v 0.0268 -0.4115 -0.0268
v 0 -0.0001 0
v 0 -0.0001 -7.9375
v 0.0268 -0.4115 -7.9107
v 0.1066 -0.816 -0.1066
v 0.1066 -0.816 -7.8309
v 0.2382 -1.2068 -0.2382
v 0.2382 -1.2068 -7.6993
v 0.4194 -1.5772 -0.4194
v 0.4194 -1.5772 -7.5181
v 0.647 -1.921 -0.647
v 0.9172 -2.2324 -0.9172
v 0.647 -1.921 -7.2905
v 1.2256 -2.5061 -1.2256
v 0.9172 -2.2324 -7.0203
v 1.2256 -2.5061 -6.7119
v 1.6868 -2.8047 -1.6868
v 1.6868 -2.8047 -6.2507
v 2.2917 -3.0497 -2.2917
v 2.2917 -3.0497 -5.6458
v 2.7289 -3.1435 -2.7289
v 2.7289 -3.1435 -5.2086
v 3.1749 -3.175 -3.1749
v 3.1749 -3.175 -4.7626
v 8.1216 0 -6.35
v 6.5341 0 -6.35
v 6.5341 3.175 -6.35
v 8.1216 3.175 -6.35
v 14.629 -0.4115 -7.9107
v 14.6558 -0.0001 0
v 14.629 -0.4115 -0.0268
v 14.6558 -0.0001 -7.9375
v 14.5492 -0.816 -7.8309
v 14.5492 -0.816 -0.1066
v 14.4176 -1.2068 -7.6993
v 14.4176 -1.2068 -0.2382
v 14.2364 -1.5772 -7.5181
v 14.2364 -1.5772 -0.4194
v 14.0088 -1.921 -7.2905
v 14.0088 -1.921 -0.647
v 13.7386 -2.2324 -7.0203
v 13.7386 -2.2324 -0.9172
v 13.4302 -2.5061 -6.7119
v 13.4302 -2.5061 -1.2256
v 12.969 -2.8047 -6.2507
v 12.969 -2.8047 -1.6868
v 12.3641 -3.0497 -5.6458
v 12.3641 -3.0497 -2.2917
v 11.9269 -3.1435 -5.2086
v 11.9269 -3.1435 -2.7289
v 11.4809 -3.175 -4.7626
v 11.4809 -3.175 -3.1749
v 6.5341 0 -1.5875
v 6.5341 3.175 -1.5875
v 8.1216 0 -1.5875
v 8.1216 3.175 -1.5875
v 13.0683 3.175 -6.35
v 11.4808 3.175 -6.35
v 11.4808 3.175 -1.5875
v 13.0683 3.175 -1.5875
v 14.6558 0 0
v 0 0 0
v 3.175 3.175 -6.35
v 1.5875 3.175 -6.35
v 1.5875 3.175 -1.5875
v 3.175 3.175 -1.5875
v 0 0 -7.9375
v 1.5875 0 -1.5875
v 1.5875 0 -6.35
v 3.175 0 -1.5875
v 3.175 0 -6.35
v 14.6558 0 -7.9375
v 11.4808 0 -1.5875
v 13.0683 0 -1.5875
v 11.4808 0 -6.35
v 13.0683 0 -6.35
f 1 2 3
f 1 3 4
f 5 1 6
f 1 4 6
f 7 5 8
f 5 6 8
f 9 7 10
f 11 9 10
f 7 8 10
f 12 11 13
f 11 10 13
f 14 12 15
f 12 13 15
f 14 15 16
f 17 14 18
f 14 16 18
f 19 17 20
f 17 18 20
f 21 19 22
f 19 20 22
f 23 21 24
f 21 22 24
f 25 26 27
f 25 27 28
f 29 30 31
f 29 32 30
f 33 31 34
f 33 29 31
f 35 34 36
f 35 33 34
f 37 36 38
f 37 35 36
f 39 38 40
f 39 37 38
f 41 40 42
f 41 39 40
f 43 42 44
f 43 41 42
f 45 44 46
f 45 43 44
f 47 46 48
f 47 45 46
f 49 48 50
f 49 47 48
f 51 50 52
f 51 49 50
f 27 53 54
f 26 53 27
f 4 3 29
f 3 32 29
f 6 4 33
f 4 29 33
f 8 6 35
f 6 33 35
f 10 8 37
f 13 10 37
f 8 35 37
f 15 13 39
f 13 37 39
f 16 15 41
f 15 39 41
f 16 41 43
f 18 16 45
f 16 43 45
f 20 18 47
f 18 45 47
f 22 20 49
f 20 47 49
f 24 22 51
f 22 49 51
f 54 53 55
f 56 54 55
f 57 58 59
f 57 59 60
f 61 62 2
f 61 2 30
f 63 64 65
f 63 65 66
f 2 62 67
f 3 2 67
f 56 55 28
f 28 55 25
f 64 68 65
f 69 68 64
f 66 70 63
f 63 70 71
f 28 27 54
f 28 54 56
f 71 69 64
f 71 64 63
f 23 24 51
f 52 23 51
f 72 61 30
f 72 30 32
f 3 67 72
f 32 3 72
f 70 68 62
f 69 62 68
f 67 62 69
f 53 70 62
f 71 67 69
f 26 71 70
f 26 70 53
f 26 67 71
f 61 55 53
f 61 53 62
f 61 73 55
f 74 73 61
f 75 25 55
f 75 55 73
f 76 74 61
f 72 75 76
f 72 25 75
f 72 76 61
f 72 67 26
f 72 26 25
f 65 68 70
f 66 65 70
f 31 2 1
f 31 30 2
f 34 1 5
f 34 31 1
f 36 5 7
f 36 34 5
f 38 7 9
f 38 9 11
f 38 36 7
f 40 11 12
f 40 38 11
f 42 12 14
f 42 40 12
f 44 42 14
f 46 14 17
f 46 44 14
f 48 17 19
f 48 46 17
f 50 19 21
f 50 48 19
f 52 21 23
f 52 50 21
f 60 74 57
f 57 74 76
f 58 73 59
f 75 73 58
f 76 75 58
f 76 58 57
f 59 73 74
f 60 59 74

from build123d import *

# Parameters (mm, degrees)
SKETCH1_W           = 14.6558
SKETCH1_H           = 7.9375
SKETCH1_W_2         = 1.5875
SKETCH1_H_2         = 4.7625
BOSS_EXTRUDE1_DEPTH = 3.175
SKETCH1_3_W         = 1.5875
SKETCH1_3_H         = 4.7625
BOSS_EXTRUDE2_DEPTH = 3.175
FILLET1_R           = 3.175


with BuildPart() as part:
    # Sketch1 → Boss-Extrude1 (new body)
    # profile 1 of 4: a face of its own
    with BuildSketch(Plane(origin=(0, 0, 0), x_dir=(1, 0, 0), z_dir=(0, 1, 0))):
        with Locations((7.3279, 3.96875)):
            Rectangle(SKETCH1_W, SKETCH1_H)
        with Locations((12.27455, 3.96875)):
            Rectangle(SKETCH1_W_2, SKETCH1_H_2, mode=Mode.SUBTRACT)
        with Locations((7.3279, 3.96875)):
            Rectangle(SKETCH1_W_2, SKETCH1_H_2, mode=Mode.SUBTRACT)
        with Locations((2.38125, 3.96875)):
            Rectangle(SKETCH1_W_2, SKETCH1_H_2, mode=Mode.SUBTRACT)
    # profile 2 of 4: a face of its own
    with BuildSketch(Plane(origin=(0, 0, 0), x_dir=(1, 0, 0), z_dir=(0, 1, 0))):
        with Locations((2.38125, 3.96875)):
            Rectangle(SKETCH1_W_2, SKETCH1_H_2)
    # profile 3 of 4: a face of its own
    with BuildSketch(Plane(origin=(0, 0, 0), x_dir=(1, 0, 0), z_dir=(0, 1, 0))):
        with Locations((7.3279, 3.96875)):
            Rectangle(SKETCH1_W_2, SKETCH1_H_2)
    # profile 4 of 4: a face of its own
    with BuildSketch(Plane(origin=(0, 0, 0), x_dir=(1, 0, 0), z_dir=(0, 1, 0))):
        with Locations((12.27455, 3.96875)):
            Rectangle(SKETCH1_W_2, SKETCH1_H_2)
    extrude(amount=-BOSS_EXTRUDE1_DEPTH)

    # Sketch1<3> → Boss-Extrude2 (add)
    with BuildSketch(Plane(origin=(0, 0, 0), x_dir=(1, 0, 0), z_dir=(0, 1, 0))):
        with Locations((2.38125, 3.96875)):
            Rectangle(SKETCH1_3_W, SKETCH1_3_H)
        with Locations((7.3279, 3.96875)):
            Rectangle(SKETCH1_3_W, SKETCH1_3_H)
        with Locations((12.27455, 3.96875)):
            Rectangle(SKETCH1_3_W, SKETCH1_3_H)
    extrude(amount=BOSS_EXTRUDE2_DEPTH)

    # Fillet1
    fillet1_edges = [part.edges().sort_by_distance(p)[0] for p in [
        (14.6558, -3.175, -3.96875),
        (7.3279, -3.175, -7.9375),
        (0, -3.175, -3.96875),
        (7.3279, -3.175, 0),
    ]]
    fillet(fillet1_edges, radius=FILLET1_R - 0.0001)  # a hair under: the kernel refuses the full size


solid = part.part
